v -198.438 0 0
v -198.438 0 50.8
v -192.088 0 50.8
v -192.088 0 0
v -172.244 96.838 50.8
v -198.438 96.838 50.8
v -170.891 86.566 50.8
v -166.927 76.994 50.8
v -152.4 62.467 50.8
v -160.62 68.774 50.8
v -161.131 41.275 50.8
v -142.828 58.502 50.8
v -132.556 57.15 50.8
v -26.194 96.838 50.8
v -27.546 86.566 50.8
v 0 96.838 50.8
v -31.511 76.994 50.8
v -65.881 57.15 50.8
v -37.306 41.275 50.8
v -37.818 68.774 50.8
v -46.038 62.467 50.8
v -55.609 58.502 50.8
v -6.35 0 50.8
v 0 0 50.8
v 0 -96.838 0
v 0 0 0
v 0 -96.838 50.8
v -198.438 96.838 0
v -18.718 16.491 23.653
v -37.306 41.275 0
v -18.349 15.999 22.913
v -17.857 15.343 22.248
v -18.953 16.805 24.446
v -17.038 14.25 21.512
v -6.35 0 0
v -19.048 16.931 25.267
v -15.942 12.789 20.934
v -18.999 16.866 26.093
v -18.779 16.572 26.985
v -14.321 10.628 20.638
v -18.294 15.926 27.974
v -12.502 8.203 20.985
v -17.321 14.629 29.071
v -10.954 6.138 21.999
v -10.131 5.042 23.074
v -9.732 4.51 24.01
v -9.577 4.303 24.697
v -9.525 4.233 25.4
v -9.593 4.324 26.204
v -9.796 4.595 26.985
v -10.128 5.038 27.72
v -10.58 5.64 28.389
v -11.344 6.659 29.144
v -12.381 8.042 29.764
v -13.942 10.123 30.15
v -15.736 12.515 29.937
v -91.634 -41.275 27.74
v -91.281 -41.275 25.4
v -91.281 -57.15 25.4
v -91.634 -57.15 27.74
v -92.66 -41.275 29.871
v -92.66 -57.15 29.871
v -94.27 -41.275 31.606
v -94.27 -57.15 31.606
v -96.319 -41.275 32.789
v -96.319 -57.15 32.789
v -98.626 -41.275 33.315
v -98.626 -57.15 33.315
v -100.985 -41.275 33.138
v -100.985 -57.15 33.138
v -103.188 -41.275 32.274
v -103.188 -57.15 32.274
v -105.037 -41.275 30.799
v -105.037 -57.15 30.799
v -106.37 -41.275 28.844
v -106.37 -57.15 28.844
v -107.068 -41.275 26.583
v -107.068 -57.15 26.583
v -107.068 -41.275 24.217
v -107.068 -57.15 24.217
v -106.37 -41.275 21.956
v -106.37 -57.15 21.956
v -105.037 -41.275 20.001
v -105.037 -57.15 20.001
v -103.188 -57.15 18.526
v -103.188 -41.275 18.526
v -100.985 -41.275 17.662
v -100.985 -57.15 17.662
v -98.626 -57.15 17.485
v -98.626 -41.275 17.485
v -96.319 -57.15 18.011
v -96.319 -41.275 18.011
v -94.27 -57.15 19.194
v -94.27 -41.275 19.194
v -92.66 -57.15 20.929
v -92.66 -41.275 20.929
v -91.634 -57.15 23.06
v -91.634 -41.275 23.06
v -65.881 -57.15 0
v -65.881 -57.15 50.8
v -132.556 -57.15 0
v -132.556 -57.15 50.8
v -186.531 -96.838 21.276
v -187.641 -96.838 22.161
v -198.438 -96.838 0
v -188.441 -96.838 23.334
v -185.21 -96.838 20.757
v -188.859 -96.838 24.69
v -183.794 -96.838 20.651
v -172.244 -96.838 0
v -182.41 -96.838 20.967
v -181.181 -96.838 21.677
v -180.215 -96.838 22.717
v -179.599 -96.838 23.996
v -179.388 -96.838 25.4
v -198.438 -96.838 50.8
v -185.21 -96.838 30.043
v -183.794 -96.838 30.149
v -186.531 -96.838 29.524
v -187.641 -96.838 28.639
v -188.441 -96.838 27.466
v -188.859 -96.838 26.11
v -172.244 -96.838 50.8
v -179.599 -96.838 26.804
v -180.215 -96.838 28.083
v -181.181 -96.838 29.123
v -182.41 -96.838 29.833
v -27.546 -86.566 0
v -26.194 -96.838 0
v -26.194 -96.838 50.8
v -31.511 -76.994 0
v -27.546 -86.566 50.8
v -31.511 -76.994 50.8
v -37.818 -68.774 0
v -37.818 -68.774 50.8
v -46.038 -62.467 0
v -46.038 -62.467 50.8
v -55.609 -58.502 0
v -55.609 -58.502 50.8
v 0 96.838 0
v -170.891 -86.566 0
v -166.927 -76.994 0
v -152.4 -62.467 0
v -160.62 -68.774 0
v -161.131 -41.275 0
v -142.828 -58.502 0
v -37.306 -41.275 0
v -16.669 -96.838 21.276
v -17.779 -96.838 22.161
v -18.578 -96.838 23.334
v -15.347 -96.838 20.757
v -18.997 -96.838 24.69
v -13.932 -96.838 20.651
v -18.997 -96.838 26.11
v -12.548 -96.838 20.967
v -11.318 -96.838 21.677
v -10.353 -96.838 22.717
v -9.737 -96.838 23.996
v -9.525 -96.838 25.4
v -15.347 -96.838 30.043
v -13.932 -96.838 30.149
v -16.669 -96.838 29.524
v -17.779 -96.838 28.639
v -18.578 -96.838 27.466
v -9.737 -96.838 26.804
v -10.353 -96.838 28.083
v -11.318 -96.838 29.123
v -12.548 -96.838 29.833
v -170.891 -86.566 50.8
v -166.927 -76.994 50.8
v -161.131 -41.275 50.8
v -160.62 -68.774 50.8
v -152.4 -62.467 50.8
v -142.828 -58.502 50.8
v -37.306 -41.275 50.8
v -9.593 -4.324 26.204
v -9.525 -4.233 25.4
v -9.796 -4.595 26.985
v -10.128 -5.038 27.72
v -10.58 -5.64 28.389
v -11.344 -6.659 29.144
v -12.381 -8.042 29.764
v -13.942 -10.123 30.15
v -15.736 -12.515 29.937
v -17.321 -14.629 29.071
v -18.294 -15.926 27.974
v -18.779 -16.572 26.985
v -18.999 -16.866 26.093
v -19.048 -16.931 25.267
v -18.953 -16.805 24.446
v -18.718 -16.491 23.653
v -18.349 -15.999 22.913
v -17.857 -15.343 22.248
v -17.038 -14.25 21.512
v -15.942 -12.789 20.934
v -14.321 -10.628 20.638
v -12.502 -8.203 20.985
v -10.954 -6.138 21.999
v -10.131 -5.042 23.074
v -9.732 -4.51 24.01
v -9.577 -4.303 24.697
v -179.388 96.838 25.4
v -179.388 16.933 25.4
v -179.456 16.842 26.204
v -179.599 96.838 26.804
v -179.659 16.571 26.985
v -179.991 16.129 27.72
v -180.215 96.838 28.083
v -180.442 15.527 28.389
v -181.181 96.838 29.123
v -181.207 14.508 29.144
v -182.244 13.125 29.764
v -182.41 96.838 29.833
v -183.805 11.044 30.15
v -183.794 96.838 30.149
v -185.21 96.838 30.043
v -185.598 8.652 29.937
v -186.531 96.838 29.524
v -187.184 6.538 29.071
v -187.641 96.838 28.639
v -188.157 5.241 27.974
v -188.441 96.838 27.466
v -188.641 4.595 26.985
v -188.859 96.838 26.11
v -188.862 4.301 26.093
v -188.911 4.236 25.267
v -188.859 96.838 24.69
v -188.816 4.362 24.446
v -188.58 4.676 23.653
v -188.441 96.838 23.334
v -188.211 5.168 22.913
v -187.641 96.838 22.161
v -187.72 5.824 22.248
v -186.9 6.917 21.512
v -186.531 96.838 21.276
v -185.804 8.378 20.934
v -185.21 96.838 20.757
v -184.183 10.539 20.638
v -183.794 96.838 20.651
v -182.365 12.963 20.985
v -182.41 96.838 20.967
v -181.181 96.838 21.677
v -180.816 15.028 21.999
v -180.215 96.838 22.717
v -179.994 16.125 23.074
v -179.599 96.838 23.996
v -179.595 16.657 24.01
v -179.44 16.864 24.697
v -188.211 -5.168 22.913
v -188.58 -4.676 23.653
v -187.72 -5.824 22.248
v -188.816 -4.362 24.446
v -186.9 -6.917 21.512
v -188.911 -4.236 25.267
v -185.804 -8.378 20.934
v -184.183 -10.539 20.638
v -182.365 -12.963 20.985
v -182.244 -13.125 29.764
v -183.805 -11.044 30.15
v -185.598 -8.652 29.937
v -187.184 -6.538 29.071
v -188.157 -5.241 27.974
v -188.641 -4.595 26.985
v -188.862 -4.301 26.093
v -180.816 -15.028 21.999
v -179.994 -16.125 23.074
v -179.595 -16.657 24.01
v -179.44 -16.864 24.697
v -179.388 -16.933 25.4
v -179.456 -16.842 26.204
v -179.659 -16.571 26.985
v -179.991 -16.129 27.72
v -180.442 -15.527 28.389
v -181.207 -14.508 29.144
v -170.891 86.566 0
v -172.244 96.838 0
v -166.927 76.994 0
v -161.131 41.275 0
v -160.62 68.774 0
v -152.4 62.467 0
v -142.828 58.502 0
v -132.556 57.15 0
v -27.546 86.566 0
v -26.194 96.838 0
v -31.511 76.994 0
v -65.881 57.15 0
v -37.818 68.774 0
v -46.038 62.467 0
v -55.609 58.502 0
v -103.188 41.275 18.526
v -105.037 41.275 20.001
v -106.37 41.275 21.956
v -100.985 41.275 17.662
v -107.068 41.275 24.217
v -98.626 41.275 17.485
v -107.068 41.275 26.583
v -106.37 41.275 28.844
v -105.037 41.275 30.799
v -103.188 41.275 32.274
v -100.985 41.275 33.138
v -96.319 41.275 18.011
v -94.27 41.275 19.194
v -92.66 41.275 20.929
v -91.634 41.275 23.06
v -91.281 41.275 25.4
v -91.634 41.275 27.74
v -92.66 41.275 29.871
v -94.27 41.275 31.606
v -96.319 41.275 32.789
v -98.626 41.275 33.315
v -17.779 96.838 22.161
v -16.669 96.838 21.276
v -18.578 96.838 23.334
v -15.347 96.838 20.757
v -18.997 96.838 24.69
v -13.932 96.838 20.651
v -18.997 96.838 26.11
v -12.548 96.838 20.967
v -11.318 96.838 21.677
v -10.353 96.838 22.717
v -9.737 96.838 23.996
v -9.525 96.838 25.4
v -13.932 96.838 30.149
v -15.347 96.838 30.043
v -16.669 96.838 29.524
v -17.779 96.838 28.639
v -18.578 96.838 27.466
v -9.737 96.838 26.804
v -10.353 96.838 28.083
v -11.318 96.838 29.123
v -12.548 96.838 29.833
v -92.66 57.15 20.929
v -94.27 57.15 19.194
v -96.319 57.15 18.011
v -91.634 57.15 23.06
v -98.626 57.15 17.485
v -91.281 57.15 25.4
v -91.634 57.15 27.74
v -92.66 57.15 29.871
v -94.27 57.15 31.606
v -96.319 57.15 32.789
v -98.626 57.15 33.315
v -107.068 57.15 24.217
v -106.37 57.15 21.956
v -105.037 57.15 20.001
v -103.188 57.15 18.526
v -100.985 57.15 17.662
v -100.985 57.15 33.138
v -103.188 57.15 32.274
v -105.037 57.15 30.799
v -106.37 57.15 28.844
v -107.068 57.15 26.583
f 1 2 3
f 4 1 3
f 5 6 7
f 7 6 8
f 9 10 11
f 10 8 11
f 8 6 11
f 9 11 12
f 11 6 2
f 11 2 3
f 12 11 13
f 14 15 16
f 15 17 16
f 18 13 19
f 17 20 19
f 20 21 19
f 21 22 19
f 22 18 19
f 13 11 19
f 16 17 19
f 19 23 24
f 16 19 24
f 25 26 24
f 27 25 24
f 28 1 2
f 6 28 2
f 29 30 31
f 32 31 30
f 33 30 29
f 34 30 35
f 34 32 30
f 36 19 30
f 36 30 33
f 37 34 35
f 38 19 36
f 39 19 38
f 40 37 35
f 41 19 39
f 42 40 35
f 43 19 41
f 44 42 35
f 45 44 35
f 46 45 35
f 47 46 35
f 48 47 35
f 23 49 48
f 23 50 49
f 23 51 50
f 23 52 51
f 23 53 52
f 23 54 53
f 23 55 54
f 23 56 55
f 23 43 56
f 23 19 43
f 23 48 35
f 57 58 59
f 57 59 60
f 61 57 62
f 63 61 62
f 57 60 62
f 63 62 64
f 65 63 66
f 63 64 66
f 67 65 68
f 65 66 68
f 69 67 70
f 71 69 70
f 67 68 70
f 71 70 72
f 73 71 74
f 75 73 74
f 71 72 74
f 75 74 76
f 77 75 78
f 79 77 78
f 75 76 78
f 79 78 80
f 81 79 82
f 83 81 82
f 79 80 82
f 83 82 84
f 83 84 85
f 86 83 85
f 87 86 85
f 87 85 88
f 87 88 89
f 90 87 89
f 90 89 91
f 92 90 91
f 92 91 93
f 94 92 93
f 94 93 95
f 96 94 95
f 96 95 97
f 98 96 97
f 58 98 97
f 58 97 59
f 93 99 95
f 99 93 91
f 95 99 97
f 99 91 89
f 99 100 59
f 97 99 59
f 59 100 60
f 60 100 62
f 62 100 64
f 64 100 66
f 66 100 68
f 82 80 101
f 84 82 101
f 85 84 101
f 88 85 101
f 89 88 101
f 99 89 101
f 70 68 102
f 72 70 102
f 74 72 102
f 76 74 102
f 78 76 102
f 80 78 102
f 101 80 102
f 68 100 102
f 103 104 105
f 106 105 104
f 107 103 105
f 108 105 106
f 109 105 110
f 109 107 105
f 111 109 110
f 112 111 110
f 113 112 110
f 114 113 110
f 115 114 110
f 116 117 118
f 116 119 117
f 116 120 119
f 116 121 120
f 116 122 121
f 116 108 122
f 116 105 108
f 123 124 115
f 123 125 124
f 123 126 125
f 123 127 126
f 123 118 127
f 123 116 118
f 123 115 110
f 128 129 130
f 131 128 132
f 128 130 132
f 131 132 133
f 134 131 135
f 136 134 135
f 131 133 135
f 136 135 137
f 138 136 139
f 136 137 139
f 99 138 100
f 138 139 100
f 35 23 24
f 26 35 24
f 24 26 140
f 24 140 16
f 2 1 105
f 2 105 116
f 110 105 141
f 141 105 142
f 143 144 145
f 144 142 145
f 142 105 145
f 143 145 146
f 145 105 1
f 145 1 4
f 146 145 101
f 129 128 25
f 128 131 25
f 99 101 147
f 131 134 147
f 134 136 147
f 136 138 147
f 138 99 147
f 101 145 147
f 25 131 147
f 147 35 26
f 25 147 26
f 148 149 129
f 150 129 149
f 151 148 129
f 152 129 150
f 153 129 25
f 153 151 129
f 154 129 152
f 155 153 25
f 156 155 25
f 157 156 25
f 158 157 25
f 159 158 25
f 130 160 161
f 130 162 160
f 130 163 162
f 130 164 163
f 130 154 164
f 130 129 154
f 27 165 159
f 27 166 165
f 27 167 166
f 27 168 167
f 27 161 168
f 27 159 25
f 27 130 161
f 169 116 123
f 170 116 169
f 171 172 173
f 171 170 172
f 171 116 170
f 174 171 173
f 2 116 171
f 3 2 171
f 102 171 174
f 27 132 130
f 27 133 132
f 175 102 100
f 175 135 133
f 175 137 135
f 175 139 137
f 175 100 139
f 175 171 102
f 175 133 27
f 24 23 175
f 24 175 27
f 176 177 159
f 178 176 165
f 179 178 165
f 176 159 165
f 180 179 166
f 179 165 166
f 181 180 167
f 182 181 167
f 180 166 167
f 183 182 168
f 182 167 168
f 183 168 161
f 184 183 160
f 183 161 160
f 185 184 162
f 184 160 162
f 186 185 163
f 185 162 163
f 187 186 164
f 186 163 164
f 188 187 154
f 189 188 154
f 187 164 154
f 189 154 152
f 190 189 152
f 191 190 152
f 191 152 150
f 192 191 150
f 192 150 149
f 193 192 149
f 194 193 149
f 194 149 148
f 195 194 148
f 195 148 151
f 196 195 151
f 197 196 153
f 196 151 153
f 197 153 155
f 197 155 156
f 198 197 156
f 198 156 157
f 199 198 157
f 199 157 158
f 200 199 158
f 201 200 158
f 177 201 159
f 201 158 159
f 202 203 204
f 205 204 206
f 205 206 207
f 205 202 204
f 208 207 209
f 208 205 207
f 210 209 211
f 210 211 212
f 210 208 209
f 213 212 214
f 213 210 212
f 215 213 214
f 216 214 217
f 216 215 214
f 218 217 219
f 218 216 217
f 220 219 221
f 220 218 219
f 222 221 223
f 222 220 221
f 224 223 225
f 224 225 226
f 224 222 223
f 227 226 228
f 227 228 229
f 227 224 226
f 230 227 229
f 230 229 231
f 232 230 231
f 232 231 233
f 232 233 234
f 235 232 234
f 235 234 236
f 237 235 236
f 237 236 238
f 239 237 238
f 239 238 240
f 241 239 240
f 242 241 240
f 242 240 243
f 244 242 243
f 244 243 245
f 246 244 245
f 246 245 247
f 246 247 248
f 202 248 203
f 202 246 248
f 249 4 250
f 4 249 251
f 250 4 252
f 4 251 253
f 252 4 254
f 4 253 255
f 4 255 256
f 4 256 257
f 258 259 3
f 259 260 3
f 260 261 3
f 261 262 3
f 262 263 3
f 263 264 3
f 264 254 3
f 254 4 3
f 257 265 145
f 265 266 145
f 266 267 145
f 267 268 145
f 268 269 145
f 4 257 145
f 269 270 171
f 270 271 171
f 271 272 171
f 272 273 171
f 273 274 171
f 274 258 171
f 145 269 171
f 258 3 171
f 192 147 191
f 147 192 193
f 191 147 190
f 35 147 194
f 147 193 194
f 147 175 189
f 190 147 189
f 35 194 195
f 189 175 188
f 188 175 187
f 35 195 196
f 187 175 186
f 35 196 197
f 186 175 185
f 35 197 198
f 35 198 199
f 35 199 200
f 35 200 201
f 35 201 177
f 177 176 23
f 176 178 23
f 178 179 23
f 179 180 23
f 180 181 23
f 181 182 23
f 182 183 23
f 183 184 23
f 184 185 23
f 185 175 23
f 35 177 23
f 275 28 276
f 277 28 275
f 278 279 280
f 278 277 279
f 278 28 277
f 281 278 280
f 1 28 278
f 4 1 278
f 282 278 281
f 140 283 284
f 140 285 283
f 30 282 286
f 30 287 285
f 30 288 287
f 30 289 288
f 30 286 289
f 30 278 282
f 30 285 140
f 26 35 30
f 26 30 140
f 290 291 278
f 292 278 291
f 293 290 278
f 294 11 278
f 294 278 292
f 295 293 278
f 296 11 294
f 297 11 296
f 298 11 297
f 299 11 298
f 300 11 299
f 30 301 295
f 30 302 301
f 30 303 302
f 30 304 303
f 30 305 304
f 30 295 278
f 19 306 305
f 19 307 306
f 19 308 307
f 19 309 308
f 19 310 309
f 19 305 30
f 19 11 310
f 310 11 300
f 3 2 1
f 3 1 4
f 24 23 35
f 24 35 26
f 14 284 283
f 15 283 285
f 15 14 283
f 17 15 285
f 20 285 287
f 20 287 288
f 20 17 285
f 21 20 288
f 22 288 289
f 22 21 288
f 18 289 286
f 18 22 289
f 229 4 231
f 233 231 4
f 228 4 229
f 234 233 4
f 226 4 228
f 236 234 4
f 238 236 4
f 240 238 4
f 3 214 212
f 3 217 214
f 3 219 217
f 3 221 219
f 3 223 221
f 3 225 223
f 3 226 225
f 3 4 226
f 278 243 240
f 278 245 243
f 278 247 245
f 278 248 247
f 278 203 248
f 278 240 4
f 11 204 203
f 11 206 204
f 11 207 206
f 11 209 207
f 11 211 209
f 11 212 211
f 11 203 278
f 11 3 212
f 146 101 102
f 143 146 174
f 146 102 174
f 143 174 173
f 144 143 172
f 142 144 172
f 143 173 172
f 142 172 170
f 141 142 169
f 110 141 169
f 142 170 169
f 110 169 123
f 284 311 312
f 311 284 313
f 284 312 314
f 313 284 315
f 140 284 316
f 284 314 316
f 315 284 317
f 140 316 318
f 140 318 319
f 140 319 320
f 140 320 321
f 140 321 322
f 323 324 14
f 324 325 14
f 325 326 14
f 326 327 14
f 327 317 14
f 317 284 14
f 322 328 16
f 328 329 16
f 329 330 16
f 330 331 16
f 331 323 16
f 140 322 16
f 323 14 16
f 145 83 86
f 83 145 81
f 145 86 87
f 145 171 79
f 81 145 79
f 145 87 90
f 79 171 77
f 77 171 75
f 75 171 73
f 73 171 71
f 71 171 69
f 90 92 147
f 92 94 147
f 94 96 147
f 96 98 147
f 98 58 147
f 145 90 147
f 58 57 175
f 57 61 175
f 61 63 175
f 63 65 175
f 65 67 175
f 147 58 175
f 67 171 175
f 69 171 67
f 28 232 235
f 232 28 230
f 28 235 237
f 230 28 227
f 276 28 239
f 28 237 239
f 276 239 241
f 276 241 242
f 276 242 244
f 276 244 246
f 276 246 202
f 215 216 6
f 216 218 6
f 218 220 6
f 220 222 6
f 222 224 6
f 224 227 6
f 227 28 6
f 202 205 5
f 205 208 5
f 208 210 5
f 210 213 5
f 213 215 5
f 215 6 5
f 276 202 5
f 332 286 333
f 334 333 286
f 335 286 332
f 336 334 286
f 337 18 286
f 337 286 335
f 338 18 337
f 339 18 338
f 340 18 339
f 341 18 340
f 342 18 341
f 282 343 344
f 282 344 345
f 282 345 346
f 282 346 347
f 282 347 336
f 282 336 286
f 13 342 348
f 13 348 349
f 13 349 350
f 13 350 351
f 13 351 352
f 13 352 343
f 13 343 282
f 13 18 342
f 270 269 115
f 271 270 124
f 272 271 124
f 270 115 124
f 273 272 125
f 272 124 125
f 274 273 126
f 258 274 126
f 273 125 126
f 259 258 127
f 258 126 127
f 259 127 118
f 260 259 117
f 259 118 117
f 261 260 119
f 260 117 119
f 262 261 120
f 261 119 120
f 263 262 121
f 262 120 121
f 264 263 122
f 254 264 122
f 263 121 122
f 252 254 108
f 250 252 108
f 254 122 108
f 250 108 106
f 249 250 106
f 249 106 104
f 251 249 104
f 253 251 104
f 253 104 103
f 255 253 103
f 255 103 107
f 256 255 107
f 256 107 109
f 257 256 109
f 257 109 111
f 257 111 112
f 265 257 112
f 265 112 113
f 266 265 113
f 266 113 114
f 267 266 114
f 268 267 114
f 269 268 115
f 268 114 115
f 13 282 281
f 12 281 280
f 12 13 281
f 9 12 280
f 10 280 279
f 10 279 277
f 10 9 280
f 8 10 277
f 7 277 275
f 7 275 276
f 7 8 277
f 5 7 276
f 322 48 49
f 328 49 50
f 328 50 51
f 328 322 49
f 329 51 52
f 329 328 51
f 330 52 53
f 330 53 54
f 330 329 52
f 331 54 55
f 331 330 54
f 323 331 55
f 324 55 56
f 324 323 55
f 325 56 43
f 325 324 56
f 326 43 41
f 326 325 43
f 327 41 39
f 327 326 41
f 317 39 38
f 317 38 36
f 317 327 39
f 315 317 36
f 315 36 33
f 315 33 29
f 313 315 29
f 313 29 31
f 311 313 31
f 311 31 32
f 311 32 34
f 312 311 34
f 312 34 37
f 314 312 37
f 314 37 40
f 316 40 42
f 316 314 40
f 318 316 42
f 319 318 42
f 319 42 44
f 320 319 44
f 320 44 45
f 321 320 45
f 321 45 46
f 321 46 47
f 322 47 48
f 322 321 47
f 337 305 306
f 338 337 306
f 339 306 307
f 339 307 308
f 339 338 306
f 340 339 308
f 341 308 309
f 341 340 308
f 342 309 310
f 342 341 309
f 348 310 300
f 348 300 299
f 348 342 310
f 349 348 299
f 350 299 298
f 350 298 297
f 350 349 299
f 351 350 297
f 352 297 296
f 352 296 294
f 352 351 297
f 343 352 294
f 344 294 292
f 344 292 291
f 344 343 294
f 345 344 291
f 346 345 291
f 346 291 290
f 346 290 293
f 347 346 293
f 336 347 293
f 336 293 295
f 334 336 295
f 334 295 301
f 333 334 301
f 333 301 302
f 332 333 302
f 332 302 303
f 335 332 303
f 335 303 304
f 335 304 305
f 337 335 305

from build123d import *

# Parameters (mm, degrees)
F0_W      = 198.4375
F0_H      = 50.8
F1_DEPTH  = 96.8375
F3_DEPTH  = 50.801
F4_DEPTH  = 50.801
F5_R      = 7.9375
F6_DEPTH  = 57.151
F8_DEPTH  = 96.8385
F9_R      = 4.7625
F10_DEPTH = 96.8385


with BuildPart() as f1:
    # F0 (on Front) → F1 (new body)
    with BuildSketch(Plane.XZ):
        with Locations((-99.21875, 25.4)):
            Rectangle(F0_W, F0_H)
    extrude(amount=F1_DEPTH)

    # F2 (on face) → F3 (cut, through all)
    with BuildSketch(Plane.XY.offset(50.8)):
        with BuildLine():
            Line((-132.55625, -96.8375), (-99.21875, -96.8375))
            Line((-99.21875, -96.8375), (-65.88125, -96.8375))
            Line((-65.88125, -96.8375), (-26.19375, -96.8375))
            ThreePointArc((-26.19375, -96.8375), (-37.81795, -68.7742), (-65.88125, -57.15))
            Line((-65.88125, -57.15), (-132.55625, -57.15))
            ThreePointArc((-132.55625, -57.15), (-160.61955, -68.7742), (-172.24375, -96.8375))
            Line((-172.24375, -96.8375), (-132.55625, -96.8375))
        make_face()
    extrude(amount=-F3_DEPTH, mode=Mode.SUBTRACT)

    # F2 (on face) → F4 (cut, through all)
    with BuildSketch(Plane.XY.offset(50.8)):
        Polygon((-6.35, 0), (-192.0875, 0), (-161.13125, -41.275), (-99.21875, -41.275), (-37.30625, -41.275), align=None)
        with BuildLine():
            Line((-132.55625, -96.8375), (-99.21875, -96.8375))
            Line((-99.21875, -96.8375), (-65.88125, -96.8375))
            Line((-65.88125, -96.8375), (-26.19375, -96.8375))
            ThreePointArc((-26.19375, -96.8375), (-37.81795, -68.7742), (-65.88125, -57.15))
            Line((-65.88125, -57.15), (-132.55625, -57.15))
            ThreePointArc((-132.55625, -57.15), (-160.61955, -68.7742), (-172.24375, -96.8375))
            Line((-172.24375, -96.8375), (-132.55625, -96.8375))
        make_face()
    extrude(amount=-F4_DEPTH, mode=Mode.SUBTRACT)

    # F5 (on face) → F6 (cut, through all)
    with BuildSketch(Plane.XZ.offset(57.15)):
        with Locations((-99.21875, 25.4)):
            Circle(F5_R)
    extrude(amount=-F6_DEPTH, mode=Mode.SUBTRACT)

    # F7 (on face) → F8 (cut, through all)
    with BuildSketch(Plane.XZ.offset(96.8375)):
        with BuildLine():
            ThreePointArc((-188.9125, 25.4), (-184.15, 20.6375), (-179.3875, 25.4))
            ThreePointArc((-179.3875, 25.4), (-184.15, 30.1625), (-188.9125, 25.4))
        make_face()
    extrude(amount=-F8_DEPTH, mode=Mode.SUBTRACT)

    # F9 (on face) → F10 (cut, through all)
    with BuildSketch(Plane.XZ.offset(96.8375)):
        with Locations((-14.2875, 25.4)):
            Circle(F9_R)
    extrude(amount=-F10_DEPTH, mode=Mode.SUBTRACT)


with BuildPart() as f11_1:
    # F11: instance of F1
    add(f1.part.mirror(Plane.XZ))


solid = Compound([f1.part, f11_1.part])
